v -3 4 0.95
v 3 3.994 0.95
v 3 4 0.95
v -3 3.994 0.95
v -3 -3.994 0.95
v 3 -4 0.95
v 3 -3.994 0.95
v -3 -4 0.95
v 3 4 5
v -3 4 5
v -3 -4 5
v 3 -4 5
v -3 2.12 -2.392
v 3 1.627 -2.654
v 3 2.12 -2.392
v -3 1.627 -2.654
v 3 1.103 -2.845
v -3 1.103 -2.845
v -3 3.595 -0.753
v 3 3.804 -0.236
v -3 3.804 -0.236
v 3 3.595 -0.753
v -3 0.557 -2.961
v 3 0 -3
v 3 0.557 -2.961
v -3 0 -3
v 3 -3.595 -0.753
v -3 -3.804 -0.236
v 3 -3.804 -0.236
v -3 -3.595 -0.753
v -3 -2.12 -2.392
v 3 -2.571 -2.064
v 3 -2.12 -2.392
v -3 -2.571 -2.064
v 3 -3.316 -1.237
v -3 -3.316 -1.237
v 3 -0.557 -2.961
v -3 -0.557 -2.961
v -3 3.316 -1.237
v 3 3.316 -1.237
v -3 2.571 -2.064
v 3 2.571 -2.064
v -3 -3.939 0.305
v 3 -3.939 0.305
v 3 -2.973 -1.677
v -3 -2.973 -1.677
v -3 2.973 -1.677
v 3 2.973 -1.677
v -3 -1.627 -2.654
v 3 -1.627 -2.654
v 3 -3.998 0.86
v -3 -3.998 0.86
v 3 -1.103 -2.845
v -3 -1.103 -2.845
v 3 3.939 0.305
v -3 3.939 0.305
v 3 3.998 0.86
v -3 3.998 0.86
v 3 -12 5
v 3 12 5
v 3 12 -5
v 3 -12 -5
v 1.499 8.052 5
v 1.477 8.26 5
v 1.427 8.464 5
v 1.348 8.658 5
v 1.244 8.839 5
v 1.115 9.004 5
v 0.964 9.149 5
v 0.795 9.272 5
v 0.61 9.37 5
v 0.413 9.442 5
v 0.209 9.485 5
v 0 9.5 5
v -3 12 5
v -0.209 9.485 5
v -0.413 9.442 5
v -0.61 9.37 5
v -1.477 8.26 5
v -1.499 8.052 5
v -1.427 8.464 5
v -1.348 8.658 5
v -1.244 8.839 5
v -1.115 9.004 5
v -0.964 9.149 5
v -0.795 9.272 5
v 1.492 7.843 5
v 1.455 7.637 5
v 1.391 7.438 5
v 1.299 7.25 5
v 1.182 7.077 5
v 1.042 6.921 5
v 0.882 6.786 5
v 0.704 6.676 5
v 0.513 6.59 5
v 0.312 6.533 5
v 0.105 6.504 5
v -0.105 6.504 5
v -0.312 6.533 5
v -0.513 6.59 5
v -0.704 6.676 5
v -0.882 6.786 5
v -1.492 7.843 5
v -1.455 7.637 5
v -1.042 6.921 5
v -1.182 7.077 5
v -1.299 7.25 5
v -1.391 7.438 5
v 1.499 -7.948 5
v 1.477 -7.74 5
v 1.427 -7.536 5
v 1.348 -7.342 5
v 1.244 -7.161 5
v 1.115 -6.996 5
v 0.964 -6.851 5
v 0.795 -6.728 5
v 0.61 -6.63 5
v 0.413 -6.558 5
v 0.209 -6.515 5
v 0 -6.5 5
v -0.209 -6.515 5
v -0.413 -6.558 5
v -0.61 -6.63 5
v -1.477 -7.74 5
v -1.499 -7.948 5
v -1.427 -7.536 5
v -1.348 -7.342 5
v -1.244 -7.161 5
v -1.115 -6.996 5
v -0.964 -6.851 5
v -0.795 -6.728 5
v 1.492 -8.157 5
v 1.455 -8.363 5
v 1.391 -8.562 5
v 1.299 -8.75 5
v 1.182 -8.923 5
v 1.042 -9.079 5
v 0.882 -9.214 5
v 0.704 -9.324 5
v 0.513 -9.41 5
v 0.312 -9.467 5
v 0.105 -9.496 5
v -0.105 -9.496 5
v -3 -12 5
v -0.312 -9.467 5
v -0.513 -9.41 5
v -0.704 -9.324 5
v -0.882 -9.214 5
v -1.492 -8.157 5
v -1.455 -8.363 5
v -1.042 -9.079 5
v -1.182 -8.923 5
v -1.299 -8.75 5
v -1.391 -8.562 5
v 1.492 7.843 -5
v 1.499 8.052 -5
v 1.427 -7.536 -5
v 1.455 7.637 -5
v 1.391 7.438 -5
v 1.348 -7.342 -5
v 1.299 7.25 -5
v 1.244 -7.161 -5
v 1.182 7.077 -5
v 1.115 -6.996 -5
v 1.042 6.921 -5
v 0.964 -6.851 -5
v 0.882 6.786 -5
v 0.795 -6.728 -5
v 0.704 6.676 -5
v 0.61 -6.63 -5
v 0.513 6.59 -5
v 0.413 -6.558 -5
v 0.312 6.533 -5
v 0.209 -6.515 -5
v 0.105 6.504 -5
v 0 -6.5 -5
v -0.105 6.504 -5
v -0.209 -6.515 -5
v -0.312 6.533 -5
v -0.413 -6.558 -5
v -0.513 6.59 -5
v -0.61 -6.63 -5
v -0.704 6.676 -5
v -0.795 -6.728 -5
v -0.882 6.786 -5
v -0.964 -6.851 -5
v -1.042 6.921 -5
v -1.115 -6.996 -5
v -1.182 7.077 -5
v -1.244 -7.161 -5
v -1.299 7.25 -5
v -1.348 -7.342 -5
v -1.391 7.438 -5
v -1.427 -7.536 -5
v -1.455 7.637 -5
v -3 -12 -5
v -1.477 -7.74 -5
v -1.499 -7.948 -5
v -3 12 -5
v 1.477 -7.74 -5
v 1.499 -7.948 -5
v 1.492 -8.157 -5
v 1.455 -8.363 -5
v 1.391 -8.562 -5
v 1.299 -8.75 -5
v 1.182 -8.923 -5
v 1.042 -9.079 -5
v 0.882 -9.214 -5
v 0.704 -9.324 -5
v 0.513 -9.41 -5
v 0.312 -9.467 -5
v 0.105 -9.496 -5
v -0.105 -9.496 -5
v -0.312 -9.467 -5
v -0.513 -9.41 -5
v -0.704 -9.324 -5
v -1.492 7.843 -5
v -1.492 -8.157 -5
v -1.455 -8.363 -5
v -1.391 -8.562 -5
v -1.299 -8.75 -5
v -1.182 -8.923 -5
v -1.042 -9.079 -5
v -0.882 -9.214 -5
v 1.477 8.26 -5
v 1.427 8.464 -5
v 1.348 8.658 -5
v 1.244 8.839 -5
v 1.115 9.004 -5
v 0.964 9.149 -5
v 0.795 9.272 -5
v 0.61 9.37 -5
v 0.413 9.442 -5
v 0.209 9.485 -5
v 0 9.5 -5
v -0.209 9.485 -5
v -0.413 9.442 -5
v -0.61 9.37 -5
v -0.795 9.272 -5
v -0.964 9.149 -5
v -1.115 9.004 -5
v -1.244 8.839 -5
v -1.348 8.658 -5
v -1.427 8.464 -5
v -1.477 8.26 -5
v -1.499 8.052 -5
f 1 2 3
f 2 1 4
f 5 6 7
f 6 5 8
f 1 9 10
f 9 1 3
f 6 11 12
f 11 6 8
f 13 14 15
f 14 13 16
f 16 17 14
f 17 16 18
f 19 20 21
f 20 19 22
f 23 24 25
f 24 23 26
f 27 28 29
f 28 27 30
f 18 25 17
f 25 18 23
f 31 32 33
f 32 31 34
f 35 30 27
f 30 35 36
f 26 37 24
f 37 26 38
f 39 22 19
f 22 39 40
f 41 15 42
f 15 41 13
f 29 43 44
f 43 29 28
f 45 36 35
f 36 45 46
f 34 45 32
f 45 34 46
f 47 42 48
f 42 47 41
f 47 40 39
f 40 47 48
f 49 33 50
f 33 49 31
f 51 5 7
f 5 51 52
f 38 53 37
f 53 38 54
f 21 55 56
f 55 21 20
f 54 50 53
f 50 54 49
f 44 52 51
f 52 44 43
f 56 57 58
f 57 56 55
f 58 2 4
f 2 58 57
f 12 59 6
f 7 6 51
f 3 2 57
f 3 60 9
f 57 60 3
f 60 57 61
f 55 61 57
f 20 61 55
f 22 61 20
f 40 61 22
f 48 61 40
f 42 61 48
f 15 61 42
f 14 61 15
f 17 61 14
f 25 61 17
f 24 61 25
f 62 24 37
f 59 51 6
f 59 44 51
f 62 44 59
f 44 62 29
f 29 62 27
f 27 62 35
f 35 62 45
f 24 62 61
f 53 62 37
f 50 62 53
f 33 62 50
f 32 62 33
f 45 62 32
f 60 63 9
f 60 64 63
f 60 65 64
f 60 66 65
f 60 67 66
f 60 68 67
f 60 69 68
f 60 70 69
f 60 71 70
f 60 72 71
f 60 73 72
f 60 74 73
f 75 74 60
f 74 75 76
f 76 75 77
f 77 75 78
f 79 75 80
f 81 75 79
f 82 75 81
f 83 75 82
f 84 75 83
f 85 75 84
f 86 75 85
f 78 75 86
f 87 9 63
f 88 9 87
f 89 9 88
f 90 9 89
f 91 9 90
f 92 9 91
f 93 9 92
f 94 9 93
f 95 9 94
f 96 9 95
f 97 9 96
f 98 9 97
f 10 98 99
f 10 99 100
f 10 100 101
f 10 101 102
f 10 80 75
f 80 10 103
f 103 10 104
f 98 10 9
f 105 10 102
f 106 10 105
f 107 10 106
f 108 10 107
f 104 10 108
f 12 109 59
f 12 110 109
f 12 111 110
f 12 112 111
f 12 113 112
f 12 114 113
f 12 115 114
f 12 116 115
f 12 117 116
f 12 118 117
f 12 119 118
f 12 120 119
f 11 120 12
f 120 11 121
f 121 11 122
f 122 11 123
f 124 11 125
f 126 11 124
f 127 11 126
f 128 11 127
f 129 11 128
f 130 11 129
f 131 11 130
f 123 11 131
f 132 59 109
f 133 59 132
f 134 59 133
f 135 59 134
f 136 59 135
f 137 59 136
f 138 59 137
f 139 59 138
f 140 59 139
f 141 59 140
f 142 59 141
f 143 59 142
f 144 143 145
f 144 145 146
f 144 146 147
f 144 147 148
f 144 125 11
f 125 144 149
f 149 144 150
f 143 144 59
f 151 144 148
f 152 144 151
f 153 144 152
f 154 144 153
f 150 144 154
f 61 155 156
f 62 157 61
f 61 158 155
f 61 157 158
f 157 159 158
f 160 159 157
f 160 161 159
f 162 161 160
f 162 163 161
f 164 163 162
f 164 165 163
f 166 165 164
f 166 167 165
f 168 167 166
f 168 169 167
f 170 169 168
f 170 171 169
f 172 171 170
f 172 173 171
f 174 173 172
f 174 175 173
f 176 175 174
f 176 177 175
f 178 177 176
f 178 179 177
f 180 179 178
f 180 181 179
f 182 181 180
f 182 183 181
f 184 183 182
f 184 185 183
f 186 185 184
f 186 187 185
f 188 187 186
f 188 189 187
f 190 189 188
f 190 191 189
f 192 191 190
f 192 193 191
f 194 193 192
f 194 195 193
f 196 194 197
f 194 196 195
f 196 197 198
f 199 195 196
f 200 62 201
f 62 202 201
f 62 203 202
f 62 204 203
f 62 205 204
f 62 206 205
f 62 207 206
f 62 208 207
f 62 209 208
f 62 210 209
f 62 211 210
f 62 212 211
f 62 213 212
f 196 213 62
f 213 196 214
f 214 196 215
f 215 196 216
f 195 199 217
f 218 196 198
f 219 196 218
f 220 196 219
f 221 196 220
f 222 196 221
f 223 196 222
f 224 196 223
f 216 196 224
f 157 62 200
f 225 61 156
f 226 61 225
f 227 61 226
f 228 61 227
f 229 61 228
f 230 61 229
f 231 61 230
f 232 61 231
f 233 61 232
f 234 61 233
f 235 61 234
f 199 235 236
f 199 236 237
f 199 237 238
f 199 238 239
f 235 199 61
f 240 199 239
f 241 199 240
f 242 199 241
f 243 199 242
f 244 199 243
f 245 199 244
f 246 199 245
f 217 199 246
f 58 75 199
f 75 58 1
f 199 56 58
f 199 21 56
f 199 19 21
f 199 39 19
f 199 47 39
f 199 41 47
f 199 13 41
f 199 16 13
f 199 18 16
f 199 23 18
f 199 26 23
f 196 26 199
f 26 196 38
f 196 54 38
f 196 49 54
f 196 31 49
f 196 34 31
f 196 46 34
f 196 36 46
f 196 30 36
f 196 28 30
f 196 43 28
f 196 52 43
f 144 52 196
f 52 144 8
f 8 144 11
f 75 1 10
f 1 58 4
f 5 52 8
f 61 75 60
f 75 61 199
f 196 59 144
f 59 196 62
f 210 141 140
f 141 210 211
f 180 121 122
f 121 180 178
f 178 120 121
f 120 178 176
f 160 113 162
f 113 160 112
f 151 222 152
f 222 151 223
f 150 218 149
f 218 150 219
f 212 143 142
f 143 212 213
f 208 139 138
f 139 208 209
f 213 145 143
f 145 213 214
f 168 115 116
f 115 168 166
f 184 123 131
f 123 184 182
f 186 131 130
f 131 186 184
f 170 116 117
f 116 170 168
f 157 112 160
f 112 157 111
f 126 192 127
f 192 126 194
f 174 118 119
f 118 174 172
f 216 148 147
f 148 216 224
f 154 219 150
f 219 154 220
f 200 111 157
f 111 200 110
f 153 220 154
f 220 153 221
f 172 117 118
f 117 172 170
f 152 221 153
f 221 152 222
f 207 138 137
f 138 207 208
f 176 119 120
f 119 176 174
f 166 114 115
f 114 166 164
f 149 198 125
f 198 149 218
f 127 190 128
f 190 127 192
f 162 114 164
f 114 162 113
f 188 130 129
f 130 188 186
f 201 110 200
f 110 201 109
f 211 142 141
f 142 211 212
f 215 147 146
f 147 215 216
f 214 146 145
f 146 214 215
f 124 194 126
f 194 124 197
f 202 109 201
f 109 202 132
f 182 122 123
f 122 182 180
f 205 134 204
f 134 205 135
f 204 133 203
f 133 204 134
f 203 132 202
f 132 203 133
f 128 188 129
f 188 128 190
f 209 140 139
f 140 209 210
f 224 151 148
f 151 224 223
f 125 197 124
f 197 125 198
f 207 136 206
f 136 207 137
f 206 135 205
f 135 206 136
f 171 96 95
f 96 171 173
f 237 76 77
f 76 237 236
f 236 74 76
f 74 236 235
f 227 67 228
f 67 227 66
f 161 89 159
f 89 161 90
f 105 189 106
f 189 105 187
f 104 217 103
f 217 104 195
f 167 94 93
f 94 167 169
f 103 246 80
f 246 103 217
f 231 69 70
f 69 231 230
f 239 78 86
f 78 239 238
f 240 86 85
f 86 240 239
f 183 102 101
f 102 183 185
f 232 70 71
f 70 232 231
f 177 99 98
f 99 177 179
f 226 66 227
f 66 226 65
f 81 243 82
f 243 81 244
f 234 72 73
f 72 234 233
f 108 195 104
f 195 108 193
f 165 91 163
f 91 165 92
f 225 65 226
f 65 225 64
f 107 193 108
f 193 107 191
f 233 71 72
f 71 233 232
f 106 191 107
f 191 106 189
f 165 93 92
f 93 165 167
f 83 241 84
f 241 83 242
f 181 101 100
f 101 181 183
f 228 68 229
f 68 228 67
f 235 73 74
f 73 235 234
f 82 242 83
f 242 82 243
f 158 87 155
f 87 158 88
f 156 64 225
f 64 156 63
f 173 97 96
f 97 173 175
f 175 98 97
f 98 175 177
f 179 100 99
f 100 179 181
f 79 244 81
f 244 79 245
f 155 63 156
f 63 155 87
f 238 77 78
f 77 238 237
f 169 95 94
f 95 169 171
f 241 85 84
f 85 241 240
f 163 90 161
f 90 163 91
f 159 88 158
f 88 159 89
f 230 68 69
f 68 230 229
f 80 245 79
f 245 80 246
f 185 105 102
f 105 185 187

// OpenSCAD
//*** Parametric cable clamp ***
//Bertrand Achard - Creative Common attribution share alike.

//v1.0 (21/12/2012) : Initial release
//v1.1 (24/12/2012) : Adds full-clamp setup (see below)

//The design assumes that the diameter of the screws is smaller than the cable.

//Two possible setups :
//
//1) Half-clamp (you can join 2 together to hold the cable)
//Factor 1.1 = presses the cable by 10%
//cable_press=cable_diam*0.5*1.1;
//cube_z=cable_diam*1.5;
//
//2) Full-clamp (you can screw the clamp to a flat surface)
//Factor 0.1 = presses the cable by 10%
//cable_press=cable_diam*0.1;
//cube_z=cable_diam*2.5;

//Diameter of the cable
cable_diam=8;
//Diameter of the 2 screws
screw_diam=3;
//How much you want the cable to be "pressed" (shifts the cable hole on the Z axis)
cable_press=cable_diam*0*1;

//The height of the cube (z axis)
cube_z=cable_diam*2.5;
//The depth of the cube (x axis), min=screw_diam+some margin
cube_x=screw_diam*4;
//The width of the cube (y axis), min=6
cube_y=cable_diam*6;

difference()
{
	cube([cube_x/2,cube_y/2,cube_z/2], true);

	translate([0,0,cube_z/4-cable_diam/2+cable_press]) union() {
		translate([0,0,cable_diam/4]) cube([cube_x/2+1, cable_diam, cable_diam/2+0.1], true);
		rotate([0,90,0])
			cylinder(h=cube_x/2+1, r1=cable_diam/2, r2=cable_diam/2, center=true, $fn=screw_diam*15);
	}

	translate([0,-cube_y/8-cable_diam/4,0])
		rotate([0,0,90])
			cylinder(h=cube_z, r1=screw_diam/2, r2=screw_diam/2, center=true, $fn=screw_diam*15);

	translate([0,cube_y/8+cable_diam/4,0])
		rotate([0,0,90])
			cylinder(h=cube_z, r1=screw_diam/2, r2=screw_diam/2, center=true, $fn=screw_diam*15);
}
